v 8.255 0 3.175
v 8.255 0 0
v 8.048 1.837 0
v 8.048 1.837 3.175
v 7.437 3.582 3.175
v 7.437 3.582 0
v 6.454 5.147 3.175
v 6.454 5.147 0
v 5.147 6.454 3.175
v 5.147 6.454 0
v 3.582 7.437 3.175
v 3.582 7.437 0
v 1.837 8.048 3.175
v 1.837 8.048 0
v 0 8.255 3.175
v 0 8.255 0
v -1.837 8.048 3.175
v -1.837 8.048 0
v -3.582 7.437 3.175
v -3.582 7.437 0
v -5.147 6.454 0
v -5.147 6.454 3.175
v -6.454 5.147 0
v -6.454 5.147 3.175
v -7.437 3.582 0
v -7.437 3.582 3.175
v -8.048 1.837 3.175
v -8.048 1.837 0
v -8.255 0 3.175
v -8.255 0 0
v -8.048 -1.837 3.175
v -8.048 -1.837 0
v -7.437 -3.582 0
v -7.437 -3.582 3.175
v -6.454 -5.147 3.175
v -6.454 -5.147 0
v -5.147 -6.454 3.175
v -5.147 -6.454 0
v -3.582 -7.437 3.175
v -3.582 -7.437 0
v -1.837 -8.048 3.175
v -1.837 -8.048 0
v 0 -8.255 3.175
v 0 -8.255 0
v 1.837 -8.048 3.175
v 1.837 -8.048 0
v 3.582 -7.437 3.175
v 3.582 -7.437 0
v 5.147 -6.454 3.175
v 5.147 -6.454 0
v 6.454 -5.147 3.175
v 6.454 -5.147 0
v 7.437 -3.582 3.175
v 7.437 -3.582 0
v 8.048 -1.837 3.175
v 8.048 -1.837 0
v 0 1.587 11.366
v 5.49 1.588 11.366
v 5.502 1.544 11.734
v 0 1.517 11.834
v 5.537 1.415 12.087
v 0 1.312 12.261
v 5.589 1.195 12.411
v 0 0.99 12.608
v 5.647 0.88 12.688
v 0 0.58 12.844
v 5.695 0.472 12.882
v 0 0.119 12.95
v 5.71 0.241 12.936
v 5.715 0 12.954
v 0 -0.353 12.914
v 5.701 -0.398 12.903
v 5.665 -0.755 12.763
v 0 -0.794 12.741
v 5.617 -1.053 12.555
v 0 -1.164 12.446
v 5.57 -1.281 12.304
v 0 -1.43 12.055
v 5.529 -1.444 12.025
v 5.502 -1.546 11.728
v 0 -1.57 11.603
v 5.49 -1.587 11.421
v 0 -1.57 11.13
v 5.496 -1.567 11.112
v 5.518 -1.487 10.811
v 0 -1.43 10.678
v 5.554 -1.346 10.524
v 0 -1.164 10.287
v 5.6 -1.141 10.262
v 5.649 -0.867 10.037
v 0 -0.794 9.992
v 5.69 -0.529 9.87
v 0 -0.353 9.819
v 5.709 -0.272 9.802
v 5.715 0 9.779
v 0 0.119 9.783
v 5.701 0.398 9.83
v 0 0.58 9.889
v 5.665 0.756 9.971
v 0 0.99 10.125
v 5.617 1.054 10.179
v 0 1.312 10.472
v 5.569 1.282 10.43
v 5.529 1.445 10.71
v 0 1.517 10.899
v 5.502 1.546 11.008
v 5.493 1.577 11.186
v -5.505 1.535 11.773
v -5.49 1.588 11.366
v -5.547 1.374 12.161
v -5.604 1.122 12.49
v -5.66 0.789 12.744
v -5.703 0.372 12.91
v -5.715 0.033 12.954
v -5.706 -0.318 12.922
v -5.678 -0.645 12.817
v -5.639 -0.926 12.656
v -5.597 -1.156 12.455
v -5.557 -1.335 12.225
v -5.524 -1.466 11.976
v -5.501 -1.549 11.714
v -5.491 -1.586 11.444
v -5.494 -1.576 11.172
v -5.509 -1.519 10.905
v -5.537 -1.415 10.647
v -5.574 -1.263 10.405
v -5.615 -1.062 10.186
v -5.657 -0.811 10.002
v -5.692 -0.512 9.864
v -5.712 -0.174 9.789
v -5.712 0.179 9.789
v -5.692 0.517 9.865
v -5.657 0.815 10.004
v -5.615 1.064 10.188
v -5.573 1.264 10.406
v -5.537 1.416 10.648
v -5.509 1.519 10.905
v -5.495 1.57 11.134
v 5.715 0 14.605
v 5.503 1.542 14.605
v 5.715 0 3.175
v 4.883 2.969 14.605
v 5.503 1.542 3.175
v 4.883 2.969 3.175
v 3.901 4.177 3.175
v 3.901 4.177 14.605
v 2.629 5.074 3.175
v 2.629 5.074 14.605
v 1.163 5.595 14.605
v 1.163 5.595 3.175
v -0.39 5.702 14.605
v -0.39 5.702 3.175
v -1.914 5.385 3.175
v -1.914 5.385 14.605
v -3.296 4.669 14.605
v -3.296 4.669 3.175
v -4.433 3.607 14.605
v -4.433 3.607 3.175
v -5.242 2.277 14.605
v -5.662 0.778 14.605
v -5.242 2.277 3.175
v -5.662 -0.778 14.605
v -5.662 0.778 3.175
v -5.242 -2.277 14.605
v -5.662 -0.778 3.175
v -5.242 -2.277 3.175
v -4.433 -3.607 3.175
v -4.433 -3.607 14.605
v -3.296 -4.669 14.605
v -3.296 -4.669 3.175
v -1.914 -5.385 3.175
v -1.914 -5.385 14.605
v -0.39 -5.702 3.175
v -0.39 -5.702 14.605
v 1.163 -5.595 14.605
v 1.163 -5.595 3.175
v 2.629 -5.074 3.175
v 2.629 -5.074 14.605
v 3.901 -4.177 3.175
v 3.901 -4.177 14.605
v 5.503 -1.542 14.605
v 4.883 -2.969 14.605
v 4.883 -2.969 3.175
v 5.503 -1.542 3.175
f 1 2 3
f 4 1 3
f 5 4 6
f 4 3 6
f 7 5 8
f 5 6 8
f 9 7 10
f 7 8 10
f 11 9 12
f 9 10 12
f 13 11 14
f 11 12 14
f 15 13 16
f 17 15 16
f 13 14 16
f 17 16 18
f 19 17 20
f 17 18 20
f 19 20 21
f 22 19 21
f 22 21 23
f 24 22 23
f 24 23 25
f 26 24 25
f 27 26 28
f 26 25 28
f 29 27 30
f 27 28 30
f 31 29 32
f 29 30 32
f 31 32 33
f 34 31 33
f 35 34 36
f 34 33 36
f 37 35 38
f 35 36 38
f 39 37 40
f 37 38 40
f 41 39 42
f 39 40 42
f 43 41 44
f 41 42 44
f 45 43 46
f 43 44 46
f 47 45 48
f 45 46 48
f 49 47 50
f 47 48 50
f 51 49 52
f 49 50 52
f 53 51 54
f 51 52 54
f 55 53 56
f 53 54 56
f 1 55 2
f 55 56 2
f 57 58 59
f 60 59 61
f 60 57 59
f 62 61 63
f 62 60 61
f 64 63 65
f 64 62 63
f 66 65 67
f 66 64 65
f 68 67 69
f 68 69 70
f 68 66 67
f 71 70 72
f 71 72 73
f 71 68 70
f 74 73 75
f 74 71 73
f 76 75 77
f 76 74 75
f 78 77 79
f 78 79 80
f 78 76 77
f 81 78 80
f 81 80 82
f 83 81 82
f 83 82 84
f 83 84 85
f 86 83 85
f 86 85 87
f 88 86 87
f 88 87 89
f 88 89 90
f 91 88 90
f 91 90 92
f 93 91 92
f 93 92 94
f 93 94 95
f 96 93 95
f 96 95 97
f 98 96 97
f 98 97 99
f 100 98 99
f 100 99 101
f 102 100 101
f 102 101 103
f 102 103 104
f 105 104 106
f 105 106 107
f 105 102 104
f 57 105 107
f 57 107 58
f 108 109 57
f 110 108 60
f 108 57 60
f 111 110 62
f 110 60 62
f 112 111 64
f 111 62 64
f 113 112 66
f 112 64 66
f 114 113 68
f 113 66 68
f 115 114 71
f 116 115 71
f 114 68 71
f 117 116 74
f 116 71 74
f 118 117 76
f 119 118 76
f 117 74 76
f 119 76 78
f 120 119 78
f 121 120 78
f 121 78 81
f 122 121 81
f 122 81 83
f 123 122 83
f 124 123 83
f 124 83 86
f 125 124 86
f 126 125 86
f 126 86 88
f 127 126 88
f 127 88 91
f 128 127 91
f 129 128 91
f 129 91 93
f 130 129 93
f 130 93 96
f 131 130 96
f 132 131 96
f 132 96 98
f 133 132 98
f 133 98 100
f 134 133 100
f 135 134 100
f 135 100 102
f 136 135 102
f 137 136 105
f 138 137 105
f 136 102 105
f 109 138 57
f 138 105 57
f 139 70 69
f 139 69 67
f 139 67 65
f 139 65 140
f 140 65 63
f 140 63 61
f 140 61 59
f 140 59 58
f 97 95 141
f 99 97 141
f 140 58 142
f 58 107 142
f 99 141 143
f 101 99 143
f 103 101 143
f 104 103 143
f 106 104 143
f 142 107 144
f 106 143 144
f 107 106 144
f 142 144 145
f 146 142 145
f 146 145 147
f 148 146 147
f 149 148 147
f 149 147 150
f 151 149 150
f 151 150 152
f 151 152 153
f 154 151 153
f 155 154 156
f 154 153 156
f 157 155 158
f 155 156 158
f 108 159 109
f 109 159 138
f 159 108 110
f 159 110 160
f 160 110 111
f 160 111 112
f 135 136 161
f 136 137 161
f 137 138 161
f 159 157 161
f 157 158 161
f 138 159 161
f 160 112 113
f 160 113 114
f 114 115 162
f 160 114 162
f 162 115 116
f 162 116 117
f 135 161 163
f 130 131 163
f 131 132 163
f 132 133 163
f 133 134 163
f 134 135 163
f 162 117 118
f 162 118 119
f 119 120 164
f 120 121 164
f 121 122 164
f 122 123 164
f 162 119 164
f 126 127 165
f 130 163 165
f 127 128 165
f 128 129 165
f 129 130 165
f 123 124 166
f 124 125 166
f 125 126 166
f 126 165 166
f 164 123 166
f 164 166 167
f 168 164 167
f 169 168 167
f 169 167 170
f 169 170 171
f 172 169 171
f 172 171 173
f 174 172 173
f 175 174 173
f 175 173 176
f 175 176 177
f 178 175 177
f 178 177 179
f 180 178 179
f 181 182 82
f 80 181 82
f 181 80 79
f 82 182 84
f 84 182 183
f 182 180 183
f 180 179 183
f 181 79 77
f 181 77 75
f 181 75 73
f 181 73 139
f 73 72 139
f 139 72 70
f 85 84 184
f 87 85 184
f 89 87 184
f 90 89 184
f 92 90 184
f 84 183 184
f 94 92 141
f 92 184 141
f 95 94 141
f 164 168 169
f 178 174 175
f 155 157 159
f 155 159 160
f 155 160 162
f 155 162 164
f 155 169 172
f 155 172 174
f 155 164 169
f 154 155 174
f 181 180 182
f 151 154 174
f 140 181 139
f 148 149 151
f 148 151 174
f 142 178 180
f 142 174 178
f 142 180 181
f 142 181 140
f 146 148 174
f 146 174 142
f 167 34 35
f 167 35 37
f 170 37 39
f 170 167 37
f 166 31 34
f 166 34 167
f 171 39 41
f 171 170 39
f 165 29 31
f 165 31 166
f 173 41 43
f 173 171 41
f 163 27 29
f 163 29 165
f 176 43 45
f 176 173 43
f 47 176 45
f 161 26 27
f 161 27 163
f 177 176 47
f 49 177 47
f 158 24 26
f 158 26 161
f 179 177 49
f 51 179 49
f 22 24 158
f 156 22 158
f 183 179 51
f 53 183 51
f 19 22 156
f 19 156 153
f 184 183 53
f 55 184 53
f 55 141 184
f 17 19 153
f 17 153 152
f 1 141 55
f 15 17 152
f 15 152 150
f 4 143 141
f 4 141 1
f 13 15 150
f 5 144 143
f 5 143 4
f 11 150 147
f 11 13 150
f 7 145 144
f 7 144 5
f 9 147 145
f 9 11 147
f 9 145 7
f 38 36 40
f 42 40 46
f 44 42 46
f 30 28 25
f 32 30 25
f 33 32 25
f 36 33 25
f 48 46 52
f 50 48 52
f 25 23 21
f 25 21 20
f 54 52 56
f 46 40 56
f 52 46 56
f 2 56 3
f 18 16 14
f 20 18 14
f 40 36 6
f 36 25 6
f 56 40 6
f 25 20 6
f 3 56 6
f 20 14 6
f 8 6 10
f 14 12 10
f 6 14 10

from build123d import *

# Parameters (mm, degrees)
F0_R          = 8.255
F1_DEPTH      = 3.175
F2_R          = 5.715
F3_DEPTH      = 11.43
F4_R          = 1.5875
F5_DEPTH      = 8.256
F5_DEPTH_BACK = 25.4


with BuildPart() as f1:
    # F0 (on Top) → F1 (new body)
    with BuildSketch(Plane.XY):
        Circle(F0_R)
    extrude(amount=F1_DEPTH)

    # F2 (on face) → F3 (join)
    with BuildSketch(Plane.XY.offset(3.175)):
        Circle(F2_R)
    extrude(amount=F3_DEPTH)

    # F4 (on Right) → F5 (cut, two sides)
    with BuildSketch(Plane.YZ) as f5_sk:
        with Locations((0, 11.3665)):
            Circle(F4_R)
    extrude(amount=-F5_DEPTH, mode=Mode.SUBTRACT)
    extrude(f5_sk.sketch, amount=F5_DEPTH_BACK, mode=Mode.SUBTRACT)


solid = f1.part
